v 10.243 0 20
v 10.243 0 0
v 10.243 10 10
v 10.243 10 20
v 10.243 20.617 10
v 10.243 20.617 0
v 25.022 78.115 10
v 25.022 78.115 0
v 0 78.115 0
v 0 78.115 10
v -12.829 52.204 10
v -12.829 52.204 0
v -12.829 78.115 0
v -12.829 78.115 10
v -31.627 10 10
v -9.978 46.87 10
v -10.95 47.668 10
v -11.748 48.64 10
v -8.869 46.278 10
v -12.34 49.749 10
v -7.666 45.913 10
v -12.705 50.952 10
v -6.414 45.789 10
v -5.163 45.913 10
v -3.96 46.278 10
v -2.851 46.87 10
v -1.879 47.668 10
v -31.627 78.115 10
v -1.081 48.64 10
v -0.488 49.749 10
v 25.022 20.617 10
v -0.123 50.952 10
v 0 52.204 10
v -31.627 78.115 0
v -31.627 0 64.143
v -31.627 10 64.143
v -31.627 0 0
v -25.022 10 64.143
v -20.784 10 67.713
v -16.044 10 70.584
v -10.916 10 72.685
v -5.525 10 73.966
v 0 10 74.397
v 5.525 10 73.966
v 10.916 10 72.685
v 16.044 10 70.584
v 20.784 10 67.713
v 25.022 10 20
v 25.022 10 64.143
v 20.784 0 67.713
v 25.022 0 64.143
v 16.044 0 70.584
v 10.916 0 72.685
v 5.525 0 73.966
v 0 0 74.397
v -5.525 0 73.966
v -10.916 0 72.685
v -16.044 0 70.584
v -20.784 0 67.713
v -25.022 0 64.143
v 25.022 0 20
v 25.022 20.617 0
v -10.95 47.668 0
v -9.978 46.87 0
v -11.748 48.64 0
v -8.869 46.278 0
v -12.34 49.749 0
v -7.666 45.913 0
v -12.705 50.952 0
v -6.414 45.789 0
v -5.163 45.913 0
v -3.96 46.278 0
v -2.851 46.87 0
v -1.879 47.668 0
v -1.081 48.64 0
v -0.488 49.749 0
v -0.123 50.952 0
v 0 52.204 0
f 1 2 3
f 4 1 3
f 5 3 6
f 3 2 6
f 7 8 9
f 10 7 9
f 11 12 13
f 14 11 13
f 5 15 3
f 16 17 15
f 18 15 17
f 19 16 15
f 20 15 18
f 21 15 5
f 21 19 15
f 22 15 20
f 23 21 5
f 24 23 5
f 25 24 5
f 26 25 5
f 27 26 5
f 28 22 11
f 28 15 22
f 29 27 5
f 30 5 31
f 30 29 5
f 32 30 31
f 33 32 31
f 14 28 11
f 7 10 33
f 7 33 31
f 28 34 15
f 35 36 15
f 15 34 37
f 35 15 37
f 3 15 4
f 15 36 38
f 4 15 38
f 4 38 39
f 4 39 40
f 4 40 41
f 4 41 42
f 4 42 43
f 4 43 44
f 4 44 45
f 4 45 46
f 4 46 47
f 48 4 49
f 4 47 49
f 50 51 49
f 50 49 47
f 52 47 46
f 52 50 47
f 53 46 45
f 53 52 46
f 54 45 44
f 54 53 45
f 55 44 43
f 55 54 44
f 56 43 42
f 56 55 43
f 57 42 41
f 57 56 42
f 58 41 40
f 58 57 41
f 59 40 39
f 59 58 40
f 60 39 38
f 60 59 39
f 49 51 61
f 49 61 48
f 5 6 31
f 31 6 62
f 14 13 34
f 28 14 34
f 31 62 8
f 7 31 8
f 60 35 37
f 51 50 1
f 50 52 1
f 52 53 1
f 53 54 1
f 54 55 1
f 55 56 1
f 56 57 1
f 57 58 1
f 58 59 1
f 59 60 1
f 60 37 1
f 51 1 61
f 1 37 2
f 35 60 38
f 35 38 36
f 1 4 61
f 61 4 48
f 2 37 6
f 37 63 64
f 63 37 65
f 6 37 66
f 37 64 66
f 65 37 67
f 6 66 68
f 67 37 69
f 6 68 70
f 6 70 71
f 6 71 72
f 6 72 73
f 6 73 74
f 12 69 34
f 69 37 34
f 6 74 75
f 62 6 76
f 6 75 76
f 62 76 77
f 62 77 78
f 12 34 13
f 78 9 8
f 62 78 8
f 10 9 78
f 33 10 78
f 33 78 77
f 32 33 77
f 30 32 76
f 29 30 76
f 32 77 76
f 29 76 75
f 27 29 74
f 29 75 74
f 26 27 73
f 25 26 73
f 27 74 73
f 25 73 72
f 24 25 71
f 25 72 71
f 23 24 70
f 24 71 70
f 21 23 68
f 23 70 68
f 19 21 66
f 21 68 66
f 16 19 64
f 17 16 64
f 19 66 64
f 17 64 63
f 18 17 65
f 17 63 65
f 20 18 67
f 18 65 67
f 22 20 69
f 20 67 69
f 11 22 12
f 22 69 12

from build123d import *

# Parameters (mm, degrees)
F0_W     = 11.9395153597
F0_H     = 19.9415329844
F1_DEPTH = 10
F3_DEPTH = 10
F4_W     = 14.7805297747
F4_H     = 20.6165611744
F5_DEPTH = 20


with BuildPart() as f1:
    # F0 (on Top) → F1 (new body)
    with BuildSketch(Plane.XY):
        with BuildLine():
            Line((-31.6270180047, 78.1149193645), (-31.6270180047, 0))
            Line((-31.6270180047, 0), (13.082661666, 0))
            Line((13.082661666, 0), (13.082661666, 19.9415329844))
            Line((13.082661666, 19.9415329844), (25.0221770257, 19.9415329844))
            Line((25.0221770257, 19.9415329844), (25.0221770257, 78.1149193645))
            Line((25.0221770257, 78.1149193645), (0, 78.1149193645))
            Line((0, 78.1149193645), (0, 52.2036328912))
            ThreePointArc((0, 52.2036328912), (-6.414314732, 45.7893181592), (-12.8286294639, 52.2036328912))
            Line((-12.8286294639, 52.2036328912), (-12.8286294639, 78.1149193645))
            Line((-12.8286294639, 78.1149193645), (-31.6270180047, 78.1149193645))
        make_face()
        with Locations((19.0524193458, 9.9707664922)):
            Rectangle(F0_W, F0_H)
    extrude(amount=F1_DEPTH)

    # F2 (on Front) → F3 (join)
    with BuildSketch(Plane.XZ):
        Polygon((-31.6270180047, 0), (25.0221770257, 0), (25.0221770257, 64.1431510448), (-25.0221770257, 64.1431510448), (-31.6270180047, 64.1431510448), align=None)
        with BuildLine():
            Line((-25.0221770257, 64.1431510448), (25.0221770257, 64.1431510448))
            ThreePointArc((25.0221770257, 64.1431510448), (0, 74.3970859516), (-25.0221770257, 64.1431510448))
        make_face()
    extrude(amount=-F3_DEPTH)

    # F4 (on Top) → F5 (cut)
    with BuildSketch(Plane.XY):
        with Locations((17.6329123788, 10.3082805872)):
            Rectangle(F4_W, F4_H)
    extrude(amount=F5_DEPTH, mode=Mode.SUBTRACT)


solid = f1.part
